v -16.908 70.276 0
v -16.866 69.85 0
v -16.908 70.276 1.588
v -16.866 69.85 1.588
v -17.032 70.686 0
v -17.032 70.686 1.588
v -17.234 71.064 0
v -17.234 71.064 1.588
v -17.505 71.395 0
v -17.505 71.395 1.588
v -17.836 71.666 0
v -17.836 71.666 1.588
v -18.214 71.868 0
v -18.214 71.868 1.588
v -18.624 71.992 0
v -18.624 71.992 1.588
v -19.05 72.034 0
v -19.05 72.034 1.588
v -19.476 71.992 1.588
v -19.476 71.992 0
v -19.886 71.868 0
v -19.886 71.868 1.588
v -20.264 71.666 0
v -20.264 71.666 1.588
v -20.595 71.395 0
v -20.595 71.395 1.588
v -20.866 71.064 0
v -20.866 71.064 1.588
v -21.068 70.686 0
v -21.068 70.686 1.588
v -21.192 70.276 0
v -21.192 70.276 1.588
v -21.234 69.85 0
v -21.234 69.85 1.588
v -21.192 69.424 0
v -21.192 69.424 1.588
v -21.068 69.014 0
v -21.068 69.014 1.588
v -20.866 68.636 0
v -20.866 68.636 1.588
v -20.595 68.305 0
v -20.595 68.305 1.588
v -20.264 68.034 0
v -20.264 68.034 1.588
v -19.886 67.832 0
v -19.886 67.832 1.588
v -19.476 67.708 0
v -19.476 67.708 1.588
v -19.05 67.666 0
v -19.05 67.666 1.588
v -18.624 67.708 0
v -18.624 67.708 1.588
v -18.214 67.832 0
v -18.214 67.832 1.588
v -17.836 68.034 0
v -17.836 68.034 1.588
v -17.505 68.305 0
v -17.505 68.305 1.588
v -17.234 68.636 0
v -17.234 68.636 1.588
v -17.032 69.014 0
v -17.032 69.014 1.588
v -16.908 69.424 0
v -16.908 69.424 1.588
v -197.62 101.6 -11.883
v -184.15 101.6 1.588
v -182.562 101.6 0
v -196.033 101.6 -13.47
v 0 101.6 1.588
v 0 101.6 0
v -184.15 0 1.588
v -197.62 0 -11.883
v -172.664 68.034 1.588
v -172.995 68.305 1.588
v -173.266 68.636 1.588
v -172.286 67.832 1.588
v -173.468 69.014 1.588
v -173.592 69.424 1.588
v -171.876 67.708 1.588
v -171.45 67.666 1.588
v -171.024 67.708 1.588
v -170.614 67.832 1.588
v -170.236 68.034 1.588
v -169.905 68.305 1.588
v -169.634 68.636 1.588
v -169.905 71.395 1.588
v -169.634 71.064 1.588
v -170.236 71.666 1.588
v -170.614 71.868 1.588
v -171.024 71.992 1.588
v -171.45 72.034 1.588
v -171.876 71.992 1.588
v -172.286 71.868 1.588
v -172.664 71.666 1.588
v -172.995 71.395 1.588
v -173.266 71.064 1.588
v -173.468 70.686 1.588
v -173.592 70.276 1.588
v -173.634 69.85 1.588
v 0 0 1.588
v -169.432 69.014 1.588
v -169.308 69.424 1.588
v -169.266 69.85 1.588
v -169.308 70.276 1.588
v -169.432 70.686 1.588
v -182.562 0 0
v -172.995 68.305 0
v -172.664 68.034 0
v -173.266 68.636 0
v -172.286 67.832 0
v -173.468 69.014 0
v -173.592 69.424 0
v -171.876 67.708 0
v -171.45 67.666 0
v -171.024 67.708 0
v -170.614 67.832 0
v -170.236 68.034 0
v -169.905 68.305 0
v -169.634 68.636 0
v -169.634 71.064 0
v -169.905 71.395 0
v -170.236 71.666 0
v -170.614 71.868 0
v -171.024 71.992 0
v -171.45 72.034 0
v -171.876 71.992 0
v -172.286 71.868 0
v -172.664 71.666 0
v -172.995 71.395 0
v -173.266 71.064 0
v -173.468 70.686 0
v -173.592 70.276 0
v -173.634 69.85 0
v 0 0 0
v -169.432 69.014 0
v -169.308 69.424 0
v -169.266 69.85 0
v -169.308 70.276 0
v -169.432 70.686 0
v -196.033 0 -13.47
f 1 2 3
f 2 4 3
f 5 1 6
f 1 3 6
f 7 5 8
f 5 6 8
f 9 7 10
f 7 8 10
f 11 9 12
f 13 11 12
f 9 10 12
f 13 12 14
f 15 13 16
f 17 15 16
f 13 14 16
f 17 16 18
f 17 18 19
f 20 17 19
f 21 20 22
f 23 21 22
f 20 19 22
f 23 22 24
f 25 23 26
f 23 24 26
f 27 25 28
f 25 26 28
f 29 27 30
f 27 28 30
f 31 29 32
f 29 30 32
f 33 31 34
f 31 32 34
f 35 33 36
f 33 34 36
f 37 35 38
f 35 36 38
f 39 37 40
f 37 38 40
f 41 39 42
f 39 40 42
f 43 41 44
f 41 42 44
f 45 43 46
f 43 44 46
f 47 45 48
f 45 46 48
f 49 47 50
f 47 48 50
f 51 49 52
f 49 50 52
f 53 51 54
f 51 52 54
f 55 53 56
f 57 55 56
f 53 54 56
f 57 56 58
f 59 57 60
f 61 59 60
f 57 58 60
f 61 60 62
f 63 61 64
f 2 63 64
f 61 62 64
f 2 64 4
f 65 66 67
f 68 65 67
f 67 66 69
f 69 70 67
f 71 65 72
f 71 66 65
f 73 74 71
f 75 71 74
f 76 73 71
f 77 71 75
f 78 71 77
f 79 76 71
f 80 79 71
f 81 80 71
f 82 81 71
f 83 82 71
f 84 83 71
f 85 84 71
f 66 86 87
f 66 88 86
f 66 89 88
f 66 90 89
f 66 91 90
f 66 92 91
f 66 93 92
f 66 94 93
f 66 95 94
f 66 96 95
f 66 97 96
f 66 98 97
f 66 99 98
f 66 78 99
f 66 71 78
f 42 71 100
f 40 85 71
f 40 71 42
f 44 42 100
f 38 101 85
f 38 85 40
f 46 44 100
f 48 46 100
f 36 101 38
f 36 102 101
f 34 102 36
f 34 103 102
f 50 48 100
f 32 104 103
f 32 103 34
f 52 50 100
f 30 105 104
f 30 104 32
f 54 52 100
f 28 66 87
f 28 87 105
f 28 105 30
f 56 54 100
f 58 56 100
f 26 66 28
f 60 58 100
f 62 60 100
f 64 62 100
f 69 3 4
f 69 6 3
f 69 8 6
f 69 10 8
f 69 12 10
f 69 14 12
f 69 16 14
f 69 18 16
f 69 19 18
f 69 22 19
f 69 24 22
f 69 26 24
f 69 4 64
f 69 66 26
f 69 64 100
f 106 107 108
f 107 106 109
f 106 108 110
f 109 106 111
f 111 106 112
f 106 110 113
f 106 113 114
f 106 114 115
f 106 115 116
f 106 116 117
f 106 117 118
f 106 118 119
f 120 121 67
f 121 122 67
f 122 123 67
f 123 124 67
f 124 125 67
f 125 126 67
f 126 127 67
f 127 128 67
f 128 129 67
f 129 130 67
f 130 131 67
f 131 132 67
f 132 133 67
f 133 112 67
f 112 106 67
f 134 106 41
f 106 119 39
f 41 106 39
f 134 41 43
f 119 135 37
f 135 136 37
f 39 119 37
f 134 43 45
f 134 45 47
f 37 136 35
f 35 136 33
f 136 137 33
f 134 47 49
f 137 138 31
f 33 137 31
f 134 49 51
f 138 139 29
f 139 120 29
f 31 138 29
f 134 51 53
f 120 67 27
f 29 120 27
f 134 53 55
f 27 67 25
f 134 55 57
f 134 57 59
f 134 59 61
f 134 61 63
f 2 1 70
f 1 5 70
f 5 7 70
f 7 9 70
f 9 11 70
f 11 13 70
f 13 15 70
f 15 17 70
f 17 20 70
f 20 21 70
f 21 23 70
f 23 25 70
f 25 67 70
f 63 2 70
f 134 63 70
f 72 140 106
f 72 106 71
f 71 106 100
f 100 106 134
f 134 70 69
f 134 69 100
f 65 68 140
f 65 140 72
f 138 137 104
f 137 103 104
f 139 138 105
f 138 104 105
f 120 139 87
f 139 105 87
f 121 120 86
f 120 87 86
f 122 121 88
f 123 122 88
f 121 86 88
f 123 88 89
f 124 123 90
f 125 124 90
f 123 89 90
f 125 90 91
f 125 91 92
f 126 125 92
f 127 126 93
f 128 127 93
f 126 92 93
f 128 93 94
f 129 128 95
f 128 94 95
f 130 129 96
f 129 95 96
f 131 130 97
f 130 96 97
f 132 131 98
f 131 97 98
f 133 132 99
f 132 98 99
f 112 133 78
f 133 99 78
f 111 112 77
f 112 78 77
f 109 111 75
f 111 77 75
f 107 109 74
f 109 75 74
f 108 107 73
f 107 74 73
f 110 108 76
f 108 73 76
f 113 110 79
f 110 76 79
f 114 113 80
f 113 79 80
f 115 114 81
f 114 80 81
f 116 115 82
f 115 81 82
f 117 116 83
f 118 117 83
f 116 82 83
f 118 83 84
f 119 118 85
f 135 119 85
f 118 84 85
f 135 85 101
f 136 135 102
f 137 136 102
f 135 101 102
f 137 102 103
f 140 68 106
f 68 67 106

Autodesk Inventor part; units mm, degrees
ref_plane "YZ Plane" through (0, 0, 0) normal (1, 0, 0) x (0, 1, 0)
ref_plane "XZ Plane" through (0, 0, 0) normal (0, 1, 0) x (-1, 0, 0)
ref_plane "XY Plane" through (0, 0, 0) normal (0, 0, 1) x (1, 0, 0)
sketch "Sketch1" plane through (0, 0, 0) normal (0, 0, 1) x (1, 0, 0)
  line L0 (0, 0) -> (-184.15, 0)
  line L1 (-184.15, 0) -> (-184.15, 101.6)
  line L2 (-184.15, 101.6) -> (0, 101.6)
  line L3 (0, 101.6) -> (0, 0)
  dimension "d0" = 184.15
  dimension "d1" = 101.6
extrude "Extrusion1" add sketch "Sketch1" along normal blind 1.5875
chamfer "Chamfer1" distance 1.5875 angle 45 1 edges at (-184.15, 50.8, 0)
sketch "Sketch2" plane through (-184.15, 0, 1.5875) normal (-0.7071, 0, -0.7071) x (-0.7071, 0, 0.7071)
  line L0 (0, 101.6) -> (0, 0) projected
  line L1 (-2.2451, 101.6) -> (-2.2451, 0) projected
  line L2 (0, 101.6) -> (-2.2451, 101.6) projected
  line L3 (-2.2451, 0) -> (0, 0) projected
  point P0 (-131.3362, 0)
extrude "Extrusion2" add sketch "Sketch2" along normal blind 19.05
sketch "Sketch3" plane through (0, 0, 1.5875) normal (0, 0, 1) x (1, 0, 0)
  circle A0 centre (-19.05, 69.85) radius 2.1844
  line L0 (-184.15, 0) -> (0, 0) projected
  line L1 (-184.15, 101.6) -> (-184.15, 0) projected
  circle A1 centre (-171.45, 69.85) radius 2.1844
  point P0 (-231.8428, 57.2075)
  point P1 (-184.15, 46.6344)
  point P2 (-184.15, 42.2656)
  dimension "d9" = 4.3688
  dimension "d10" = 69.85
  dimension "d11" = 165.1
  dimension "d17" = 4.3688
  dimension "d18" = 152.4
extrude "Extrusion3" cut sketch "Sketch3" against normal blind 19.05
properties part number "frontwing"
